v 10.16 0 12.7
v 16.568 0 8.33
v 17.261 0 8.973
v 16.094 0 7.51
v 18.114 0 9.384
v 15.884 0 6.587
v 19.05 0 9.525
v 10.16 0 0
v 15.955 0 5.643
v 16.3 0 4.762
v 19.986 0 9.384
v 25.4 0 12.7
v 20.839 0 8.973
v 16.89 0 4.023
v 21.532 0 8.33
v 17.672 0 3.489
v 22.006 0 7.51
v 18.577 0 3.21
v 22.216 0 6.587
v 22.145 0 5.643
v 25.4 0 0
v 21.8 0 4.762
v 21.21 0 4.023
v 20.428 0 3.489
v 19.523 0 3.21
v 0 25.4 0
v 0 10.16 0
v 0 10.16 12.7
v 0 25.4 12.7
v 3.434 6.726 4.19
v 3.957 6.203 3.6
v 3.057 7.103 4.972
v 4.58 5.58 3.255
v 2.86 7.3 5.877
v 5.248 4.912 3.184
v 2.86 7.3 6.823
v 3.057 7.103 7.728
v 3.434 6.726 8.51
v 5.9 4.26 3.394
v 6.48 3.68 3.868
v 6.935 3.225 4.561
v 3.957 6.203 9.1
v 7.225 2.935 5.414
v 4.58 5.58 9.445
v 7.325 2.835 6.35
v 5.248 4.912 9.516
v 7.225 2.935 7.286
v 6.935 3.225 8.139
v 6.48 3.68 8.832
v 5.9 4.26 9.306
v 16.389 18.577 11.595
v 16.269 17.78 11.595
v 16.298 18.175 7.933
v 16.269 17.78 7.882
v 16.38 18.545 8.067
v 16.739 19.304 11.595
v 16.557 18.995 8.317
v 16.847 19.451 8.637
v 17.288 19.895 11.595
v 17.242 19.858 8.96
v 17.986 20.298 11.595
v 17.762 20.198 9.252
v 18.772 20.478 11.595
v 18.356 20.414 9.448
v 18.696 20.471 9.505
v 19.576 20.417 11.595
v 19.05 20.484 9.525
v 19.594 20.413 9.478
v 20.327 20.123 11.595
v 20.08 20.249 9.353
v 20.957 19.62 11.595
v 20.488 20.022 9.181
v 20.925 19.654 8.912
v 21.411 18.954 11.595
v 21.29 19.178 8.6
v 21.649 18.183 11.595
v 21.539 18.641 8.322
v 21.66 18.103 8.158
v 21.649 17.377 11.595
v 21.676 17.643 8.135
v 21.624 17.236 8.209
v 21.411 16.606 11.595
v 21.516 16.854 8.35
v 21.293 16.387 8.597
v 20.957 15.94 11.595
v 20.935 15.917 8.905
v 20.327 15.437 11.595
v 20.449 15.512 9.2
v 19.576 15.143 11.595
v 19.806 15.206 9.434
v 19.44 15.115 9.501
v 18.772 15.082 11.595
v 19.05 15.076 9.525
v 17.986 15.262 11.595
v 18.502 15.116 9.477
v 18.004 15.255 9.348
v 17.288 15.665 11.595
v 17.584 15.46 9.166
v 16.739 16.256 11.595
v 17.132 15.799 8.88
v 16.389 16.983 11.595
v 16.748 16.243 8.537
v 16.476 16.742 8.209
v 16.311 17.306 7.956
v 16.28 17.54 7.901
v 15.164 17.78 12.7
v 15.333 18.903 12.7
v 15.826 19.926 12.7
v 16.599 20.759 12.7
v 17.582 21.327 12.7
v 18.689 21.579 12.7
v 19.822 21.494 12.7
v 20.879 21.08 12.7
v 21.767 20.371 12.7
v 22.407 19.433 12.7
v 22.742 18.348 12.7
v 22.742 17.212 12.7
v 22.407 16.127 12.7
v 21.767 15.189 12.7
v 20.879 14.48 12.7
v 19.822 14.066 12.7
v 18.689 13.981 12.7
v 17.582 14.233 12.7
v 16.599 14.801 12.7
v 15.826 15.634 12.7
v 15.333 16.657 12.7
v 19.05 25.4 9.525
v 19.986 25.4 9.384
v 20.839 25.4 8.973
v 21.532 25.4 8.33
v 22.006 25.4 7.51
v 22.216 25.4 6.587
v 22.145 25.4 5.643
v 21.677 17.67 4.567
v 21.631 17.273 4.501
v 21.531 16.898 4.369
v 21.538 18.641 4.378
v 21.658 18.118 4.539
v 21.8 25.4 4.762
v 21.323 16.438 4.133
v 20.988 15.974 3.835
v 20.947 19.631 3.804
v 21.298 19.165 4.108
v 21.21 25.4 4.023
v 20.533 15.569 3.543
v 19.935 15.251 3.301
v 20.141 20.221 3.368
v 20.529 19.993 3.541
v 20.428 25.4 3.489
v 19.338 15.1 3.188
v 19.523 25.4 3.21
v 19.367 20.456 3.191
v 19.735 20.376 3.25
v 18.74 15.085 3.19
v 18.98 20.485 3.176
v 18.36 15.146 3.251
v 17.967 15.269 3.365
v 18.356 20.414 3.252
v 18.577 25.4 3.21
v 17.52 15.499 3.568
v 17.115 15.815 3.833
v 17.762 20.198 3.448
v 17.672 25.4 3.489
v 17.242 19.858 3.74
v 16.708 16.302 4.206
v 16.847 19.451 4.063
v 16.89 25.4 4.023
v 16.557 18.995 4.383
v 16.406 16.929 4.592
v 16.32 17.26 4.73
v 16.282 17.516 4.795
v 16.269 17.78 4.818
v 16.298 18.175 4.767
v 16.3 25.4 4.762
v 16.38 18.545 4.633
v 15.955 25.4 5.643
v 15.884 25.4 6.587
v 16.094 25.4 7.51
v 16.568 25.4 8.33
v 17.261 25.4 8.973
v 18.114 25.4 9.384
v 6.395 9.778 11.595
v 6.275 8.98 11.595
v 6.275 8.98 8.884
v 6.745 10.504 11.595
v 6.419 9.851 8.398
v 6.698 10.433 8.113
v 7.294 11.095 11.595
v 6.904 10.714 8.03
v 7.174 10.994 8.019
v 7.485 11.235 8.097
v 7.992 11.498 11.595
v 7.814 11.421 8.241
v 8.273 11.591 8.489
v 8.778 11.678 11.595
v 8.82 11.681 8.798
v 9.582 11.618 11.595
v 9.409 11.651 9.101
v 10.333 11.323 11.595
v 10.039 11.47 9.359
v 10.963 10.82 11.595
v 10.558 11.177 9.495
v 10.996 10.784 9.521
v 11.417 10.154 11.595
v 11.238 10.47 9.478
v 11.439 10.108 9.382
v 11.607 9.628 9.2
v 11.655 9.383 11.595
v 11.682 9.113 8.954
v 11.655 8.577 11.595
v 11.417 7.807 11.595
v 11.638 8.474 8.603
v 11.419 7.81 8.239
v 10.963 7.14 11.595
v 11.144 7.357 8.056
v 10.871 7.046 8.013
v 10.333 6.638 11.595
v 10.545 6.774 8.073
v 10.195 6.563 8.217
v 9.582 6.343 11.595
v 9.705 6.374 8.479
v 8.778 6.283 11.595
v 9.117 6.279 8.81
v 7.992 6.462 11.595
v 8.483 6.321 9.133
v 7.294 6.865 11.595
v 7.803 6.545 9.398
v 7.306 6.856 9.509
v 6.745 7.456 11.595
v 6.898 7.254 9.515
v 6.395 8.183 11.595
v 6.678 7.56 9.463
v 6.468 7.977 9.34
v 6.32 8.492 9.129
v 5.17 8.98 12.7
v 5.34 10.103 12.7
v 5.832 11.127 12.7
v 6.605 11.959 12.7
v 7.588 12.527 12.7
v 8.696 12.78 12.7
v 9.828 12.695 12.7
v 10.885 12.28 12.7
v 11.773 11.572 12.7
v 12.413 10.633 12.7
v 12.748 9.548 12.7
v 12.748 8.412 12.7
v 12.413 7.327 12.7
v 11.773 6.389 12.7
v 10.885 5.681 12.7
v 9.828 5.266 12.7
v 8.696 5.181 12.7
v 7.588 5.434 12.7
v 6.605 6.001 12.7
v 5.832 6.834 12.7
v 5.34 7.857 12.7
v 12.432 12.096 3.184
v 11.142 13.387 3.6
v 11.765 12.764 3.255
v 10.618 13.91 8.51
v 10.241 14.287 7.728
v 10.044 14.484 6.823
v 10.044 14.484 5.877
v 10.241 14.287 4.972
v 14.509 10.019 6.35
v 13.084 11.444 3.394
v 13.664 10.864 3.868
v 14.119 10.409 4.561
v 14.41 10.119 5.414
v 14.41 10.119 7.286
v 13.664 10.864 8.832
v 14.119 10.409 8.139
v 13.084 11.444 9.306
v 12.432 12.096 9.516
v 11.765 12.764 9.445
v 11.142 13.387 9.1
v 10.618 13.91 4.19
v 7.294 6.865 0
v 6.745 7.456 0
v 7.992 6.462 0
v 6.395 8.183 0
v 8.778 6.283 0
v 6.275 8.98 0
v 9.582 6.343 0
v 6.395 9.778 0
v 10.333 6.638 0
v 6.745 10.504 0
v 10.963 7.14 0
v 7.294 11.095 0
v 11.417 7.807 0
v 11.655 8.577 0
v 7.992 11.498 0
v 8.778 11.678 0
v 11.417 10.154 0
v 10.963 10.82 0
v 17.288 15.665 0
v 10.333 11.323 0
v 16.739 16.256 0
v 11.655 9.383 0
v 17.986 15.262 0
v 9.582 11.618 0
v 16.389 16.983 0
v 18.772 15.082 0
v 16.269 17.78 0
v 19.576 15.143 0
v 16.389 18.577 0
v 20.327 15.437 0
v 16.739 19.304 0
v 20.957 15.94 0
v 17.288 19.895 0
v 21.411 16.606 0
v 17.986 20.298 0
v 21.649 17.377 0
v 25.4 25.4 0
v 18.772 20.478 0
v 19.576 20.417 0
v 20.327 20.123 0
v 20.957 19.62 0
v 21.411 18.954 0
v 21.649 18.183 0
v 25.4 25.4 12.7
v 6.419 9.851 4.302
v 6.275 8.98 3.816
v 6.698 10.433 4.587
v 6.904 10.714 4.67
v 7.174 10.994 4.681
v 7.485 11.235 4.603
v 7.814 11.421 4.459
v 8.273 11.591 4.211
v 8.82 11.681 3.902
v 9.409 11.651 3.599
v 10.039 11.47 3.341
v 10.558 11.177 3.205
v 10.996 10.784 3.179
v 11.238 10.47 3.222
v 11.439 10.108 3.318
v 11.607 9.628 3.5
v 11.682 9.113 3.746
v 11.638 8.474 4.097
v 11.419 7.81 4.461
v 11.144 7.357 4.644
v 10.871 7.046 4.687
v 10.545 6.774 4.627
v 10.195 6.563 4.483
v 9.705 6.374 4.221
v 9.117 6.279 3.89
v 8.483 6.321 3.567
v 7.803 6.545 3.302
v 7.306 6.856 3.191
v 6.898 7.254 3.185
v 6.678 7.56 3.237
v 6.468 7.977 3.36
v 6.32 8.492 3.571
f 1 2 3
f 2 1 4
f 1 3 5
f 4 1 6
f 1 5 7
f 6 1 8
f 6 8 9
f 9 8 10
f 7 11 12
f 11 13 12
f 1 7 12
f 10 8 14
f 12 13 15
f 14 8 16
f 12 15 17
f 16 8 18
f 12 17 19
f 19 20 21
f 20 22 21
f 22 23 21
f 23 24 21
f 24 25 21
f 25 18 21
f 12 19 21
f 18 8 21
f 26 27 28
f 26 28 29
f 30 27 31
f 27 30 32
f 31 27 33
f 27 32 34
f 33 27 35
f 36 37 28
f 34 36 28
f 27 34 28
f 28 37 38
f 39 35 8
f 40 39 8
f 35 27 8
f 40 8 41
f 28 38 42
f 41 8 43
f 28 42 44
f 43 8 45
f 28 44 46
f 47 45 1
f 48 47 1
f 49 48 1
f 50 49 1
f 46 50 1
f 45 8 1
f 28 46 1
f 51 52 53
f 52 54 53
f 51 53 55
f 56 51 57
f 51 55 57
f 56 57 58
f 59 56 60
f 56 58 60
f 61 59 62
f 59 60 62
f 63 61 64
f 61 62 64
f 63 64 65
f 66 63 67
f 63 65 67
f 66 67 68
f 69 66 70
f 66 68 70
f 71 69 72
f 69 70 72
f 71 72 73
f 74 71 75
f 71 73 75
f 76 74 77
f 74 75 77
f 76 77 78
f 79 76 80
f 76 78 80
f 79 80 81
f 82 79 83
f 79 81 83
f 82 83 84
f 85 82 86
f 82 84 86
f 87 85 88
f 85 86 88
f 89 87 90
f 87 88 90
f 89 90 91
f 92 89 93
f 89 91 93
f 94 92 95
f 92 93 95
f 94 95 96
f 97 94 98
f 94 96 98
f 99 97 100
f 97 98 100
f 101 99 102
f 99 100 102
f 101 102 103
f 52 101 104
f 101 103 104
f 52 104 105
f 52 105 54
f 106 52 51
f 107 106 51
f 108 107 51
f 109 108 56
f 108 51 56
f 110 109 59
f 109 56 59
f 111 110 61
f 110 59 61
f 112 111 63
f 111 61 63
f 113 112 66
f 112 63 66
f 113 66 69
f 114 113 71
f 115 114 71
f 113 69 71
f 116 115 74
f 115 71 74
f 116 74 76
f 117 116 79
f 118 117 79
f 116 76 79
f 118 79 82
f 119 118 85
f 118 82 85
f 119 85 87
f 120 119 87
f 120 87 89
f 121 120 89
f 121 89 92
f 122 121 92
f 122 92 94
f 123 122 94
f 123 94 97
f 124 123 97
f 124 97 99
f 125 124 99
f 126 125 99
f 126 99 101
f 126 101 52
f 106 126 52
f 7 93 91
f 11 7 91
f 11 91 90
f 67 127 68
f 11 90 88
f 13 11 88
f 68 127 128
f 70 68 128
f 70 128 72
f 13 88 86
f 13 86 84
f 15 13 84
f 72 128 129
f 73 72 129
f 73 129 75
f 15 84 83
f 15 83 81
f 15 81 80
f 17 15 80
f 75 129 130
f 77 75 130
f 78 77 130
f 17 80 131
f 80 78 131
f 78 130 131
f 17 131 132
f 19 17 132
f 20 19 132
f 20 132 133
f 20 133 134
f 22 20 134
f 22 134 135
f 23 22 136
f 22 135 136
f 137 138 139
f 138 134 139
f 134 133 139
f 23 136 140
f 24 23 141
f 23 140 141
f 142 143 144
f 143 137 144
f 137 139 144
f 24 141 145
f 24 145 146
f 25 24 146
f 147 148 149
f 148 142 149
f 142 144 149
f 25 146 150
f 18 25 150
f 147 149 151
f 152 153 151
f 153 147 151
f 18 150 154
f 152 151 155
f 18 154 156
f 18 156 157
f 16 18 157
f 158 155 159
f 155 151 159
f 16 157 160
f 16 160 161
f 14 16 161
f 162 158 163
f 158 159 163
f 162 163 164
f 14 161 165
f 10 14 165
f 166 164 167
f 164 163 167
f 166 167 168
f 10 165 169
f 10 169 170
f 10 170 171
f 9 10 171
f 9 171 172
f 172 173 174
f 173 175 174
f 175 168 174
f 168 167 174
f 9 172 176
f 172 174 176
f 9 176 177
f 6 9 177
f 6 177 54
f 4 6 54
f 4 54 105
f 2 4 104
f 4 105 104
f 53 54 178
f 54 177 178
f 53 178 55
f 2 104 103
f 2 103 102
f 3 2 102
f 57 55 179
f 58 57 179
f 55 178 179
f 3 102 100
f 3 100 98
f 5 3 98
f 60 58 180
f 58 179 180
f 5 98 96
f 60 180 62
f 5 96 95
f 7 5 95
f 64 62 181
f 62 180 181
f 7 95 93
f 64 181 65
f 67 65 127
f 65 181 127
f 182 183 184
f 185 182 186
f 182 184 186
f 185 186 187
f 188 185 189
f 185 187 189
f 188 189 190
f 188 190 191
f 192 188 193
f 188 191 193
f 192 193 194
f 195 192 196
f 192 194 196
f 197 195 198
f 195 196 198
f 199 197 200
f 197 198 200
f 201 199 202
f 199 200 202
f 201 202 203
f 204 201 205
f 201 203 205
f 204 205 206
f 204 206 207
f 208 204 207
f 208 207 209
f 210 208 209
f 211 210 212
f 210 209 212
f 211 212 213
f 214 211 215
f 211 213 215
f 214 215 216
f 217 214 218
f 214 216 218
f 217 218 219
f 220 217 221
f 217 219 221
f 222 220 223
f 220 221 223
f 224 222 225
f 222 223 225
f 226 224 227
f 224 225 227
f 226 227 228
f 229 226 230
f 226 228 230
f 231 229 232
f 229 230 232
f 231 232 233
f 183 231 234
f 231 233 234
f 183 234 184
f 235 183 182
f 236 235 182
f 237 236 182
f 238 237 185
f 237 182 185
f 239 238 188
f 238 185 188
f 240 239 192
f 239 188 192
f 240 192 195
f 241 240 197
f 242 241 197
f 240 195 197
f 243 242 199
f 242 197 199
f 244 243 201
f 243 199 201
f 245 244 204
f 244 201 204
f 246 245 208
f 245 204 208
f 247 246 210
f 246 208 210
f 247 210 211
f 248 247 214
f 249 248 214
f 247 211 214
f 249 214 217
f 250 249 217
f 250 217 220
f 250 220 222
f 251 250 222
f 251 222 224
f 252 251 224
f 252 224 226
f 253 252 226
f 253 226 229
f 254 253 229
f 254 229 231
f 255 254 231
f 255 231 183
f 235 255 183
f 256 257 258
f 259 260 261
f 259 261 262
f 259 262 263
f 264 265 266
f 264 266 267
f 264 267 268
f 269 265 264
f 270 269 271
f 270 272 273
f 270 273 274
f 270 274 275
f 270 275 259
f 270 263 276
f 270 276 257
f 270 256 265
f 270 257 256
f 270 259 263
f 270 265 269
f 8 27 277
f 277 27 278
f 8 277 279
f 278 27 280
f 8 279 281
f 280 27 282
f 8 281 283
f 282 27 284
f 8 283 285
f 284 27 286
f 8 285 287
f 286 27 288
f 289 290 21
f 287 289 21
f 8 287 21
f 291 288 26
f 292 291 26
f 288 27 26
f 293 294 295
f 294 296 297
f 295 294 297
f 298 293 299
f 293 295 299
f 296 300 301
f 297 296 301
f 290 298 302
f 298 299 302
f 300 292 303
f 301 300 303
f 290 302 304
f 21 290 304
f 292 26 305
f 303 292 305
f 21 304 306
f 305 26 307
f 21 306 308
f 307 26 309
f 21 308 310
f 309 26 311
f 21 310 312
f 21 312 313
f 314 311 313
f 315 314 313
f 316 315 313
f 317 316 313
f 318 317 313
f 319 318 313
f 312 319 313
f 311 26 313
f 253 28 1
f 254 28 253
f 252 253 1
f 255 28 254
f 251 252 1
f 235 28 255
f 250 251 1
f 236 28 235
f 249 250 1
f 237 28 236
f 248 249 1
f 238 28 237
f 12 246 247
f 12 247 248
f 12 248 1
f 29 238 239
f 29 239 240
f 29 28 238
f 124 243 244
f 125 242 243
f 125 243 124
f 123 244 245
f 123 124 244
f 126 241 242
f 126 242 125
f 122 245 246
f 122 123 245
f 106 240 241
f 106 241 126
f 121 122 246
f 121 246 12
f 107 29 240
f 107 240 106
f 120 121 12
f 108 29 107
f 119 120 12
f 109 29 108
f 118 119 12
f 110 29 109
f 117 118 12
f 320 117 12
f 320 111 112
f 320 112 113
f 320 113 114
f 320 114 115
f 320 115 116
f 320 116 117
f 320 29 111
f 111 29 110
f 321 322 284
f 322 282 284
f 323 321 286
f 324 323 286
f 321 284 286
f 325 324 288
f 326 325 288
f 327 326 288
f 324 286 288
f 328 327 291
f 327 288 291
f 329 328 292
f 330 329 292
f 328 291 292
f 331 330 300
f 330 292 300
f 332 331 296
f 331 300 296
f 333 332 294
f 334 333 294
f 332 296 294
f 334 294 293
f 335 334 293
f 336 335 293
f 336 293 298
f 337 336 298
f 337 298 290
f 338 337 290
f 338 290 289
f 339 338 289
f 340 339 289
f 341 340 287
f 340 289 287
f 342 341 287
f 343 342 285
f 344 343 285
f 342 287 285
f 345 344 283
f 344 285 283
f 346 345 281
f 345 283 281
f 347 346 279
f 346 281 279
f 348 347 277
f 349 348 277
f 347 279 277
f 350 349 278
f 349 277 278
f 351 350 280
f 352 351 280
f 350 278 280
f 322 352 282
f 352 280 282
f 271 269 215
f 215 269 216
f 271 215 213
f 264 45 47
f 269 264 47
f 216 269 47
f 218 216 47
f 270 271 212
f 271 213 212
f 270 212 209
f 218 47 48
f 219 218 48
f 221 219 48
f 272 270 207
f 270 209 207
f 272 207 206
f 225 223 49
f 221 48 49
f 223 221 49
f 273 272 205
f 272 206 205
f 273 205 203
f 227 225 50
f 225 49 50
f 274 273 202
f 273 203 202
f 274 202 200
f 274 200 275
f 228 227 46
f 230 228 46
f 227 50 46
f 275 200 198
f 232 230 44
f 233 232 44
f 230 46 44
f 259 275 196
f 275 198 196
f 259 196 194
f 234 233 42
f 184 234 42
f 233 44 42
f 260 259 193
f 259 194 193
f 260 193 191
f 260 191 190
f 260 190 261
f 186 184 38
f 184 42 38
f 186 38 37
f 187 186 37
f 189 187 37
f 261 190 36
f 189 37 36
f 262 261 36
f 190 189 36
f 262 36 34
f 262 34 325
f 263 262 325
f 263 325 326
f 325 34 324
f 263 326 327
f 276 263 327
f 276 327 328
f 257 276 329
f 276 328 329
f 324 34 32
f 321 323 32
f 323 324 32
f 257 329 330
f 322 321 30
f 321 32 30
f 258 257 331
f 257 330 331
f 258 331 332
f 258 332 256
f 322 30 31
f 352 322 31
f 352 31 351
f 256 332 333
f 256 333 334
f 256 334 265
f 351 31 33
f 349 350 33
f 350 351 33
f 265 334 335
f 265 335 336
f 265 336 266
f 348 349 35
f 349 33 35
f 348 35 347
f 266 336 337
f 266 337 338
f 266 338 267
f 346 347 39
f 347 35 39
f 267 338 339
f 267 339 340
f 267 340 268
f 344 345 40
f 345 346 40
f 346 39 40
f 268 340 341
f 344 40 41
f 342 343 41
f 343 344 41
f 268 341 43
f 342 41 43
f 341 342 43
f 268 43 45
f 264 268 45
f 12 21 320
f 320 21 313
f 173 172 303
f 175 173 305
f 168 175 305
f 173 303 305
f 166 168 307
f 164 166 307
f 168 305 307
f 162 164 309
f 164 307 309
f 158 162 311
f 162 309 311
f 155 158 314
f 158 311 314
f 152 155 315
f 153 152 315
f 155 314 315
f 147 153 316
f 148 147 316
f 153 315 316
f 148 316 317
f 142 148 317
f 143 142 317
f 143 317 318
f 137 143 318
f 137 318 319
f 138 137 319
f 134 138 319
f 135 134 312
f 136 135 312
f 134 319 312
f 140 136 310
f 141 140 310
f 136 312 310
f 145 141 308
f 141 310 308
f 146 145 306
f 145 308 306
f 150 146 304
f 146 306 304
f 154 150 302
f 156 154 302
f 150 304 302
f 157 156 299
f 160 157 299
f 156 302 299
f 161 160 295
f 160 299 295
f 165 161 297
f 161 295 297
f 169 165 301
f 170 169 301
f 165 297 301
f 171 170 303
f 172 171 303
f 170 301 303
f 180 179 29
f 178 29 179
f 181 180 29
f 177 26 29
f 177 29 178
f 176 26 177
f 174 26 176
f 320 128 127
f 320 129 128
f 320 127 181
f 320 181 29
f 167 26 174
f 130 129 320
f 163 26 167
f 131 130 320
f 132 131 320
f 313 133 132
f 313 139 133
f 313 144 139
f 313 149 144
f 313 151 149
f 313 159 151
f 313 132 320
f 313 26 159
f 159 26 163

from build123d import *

# Parameters (mm, degrees)
SKETCH1_W                         = 25.4
SKETCH1_H                         = 25.4
BOSS_EXTRUDE1_DEPTH               = 12.7
CHAMFER1_SIZE                     = 10.16
SKETCH2_R                         = 3.175
CUT_EXTRUDE1_DEPTH                = 25.4
SKETCH3_R                         = 3.175
CUT_EXTRUDE2_DEPTH                = 10.16
F_1_4_28_TAPPED_HOLE1_D           = 5.4102
F_1_4_28_TAPPED_HOLE1_DEPTH       = 15.494
F_1_4_28_TAPPED_HOLE1_CSINK_D     = 7.62
F_1_4_28_TAPPED_HOLE1_CSINK_ANGLE = 90
F_1_4_28_TAPPED_HOLE1_TIP         = 1.625388061


with BuildPart() as part:
    # Sketch1 → Boss-Extrude1 (new body)
    with BuildSketch(Plane.XY):
        with Locations((12.7, 12.7)):
            Rectangle(SKETCH1_W, SKETCH1_H)
    extrude(amount=BOSS_EXTRUDE1_DEPTH)

    # Chamfer1
    chamfer1_edges = [part.edges().sort_by_distance(p)[0] for p in [
        (0, 0, 6.35),
    ]]
    chamfer(chamfer1_edges, length=CHAMFER1_SIZE)

    # Sketch2 → Cut-Extrude1 (cut)
    with BuildSketch(Plane(origin=(0, 25.4, 0), x_dir=(1, 0, 0), z_dir=(0, 1, 0))):
        with Locations(Location((19.05, -6.35, 0), (0, 0, 270))):
            Circle(SKETCH2_R)
    extrude(amount=-CUT_EXTRUDE1_DEPTH, mode=Mode.SUBTRACT)

    # Sketch3 → Cut-Extrude2 (cut)
    with BuildSketch(Plane(origin=(5.08, 5.08, 0), x_dir=(0, 0, 1), z_dir=(-0.7071067811865488, -0.7071067811865462, 0))):
        with Locations(Location((6.35, 0, 0), (0, 0, 270))):
            Circle(SKETCH3_R)
    extrude(amount=-CUT_EXTRUDE2_DEPTH, mode=Mode.SUBTRACT)

    # 1/4-28 Tapped Hole1
    with Locations(Plane.XY.offset(12.7)):
        with Locations((8.980256121, 8.980256121), (18.974124868, 17.78)):
            CounterSinkHole(F_1_4_28_TAPPED_HOLE1_D / 2, F_1_4_28_TAPPED_HOLE1_CSINK_D / 2, depth=F_1_4_28_TAPPED_HOLE1_DEPTH, counter_sink_angle=F_1_4_28_TAPPED_HOLE1_CSINK_ANGLE)
            with Locations((0, 0, -(F_1_4_28_TAPPED_HOLE1_DEPTH + F_1_4_28_TAPPED_HOLE1_TIP / 2))):  # 118° drill point
                Cone(0, F_1_4_28_TAPPED_HOLE1_D / 2, F_1_4_28_TAPPED_HOLE1_TIP, mode=Mode.SUBTRACT)


solid = part.part
